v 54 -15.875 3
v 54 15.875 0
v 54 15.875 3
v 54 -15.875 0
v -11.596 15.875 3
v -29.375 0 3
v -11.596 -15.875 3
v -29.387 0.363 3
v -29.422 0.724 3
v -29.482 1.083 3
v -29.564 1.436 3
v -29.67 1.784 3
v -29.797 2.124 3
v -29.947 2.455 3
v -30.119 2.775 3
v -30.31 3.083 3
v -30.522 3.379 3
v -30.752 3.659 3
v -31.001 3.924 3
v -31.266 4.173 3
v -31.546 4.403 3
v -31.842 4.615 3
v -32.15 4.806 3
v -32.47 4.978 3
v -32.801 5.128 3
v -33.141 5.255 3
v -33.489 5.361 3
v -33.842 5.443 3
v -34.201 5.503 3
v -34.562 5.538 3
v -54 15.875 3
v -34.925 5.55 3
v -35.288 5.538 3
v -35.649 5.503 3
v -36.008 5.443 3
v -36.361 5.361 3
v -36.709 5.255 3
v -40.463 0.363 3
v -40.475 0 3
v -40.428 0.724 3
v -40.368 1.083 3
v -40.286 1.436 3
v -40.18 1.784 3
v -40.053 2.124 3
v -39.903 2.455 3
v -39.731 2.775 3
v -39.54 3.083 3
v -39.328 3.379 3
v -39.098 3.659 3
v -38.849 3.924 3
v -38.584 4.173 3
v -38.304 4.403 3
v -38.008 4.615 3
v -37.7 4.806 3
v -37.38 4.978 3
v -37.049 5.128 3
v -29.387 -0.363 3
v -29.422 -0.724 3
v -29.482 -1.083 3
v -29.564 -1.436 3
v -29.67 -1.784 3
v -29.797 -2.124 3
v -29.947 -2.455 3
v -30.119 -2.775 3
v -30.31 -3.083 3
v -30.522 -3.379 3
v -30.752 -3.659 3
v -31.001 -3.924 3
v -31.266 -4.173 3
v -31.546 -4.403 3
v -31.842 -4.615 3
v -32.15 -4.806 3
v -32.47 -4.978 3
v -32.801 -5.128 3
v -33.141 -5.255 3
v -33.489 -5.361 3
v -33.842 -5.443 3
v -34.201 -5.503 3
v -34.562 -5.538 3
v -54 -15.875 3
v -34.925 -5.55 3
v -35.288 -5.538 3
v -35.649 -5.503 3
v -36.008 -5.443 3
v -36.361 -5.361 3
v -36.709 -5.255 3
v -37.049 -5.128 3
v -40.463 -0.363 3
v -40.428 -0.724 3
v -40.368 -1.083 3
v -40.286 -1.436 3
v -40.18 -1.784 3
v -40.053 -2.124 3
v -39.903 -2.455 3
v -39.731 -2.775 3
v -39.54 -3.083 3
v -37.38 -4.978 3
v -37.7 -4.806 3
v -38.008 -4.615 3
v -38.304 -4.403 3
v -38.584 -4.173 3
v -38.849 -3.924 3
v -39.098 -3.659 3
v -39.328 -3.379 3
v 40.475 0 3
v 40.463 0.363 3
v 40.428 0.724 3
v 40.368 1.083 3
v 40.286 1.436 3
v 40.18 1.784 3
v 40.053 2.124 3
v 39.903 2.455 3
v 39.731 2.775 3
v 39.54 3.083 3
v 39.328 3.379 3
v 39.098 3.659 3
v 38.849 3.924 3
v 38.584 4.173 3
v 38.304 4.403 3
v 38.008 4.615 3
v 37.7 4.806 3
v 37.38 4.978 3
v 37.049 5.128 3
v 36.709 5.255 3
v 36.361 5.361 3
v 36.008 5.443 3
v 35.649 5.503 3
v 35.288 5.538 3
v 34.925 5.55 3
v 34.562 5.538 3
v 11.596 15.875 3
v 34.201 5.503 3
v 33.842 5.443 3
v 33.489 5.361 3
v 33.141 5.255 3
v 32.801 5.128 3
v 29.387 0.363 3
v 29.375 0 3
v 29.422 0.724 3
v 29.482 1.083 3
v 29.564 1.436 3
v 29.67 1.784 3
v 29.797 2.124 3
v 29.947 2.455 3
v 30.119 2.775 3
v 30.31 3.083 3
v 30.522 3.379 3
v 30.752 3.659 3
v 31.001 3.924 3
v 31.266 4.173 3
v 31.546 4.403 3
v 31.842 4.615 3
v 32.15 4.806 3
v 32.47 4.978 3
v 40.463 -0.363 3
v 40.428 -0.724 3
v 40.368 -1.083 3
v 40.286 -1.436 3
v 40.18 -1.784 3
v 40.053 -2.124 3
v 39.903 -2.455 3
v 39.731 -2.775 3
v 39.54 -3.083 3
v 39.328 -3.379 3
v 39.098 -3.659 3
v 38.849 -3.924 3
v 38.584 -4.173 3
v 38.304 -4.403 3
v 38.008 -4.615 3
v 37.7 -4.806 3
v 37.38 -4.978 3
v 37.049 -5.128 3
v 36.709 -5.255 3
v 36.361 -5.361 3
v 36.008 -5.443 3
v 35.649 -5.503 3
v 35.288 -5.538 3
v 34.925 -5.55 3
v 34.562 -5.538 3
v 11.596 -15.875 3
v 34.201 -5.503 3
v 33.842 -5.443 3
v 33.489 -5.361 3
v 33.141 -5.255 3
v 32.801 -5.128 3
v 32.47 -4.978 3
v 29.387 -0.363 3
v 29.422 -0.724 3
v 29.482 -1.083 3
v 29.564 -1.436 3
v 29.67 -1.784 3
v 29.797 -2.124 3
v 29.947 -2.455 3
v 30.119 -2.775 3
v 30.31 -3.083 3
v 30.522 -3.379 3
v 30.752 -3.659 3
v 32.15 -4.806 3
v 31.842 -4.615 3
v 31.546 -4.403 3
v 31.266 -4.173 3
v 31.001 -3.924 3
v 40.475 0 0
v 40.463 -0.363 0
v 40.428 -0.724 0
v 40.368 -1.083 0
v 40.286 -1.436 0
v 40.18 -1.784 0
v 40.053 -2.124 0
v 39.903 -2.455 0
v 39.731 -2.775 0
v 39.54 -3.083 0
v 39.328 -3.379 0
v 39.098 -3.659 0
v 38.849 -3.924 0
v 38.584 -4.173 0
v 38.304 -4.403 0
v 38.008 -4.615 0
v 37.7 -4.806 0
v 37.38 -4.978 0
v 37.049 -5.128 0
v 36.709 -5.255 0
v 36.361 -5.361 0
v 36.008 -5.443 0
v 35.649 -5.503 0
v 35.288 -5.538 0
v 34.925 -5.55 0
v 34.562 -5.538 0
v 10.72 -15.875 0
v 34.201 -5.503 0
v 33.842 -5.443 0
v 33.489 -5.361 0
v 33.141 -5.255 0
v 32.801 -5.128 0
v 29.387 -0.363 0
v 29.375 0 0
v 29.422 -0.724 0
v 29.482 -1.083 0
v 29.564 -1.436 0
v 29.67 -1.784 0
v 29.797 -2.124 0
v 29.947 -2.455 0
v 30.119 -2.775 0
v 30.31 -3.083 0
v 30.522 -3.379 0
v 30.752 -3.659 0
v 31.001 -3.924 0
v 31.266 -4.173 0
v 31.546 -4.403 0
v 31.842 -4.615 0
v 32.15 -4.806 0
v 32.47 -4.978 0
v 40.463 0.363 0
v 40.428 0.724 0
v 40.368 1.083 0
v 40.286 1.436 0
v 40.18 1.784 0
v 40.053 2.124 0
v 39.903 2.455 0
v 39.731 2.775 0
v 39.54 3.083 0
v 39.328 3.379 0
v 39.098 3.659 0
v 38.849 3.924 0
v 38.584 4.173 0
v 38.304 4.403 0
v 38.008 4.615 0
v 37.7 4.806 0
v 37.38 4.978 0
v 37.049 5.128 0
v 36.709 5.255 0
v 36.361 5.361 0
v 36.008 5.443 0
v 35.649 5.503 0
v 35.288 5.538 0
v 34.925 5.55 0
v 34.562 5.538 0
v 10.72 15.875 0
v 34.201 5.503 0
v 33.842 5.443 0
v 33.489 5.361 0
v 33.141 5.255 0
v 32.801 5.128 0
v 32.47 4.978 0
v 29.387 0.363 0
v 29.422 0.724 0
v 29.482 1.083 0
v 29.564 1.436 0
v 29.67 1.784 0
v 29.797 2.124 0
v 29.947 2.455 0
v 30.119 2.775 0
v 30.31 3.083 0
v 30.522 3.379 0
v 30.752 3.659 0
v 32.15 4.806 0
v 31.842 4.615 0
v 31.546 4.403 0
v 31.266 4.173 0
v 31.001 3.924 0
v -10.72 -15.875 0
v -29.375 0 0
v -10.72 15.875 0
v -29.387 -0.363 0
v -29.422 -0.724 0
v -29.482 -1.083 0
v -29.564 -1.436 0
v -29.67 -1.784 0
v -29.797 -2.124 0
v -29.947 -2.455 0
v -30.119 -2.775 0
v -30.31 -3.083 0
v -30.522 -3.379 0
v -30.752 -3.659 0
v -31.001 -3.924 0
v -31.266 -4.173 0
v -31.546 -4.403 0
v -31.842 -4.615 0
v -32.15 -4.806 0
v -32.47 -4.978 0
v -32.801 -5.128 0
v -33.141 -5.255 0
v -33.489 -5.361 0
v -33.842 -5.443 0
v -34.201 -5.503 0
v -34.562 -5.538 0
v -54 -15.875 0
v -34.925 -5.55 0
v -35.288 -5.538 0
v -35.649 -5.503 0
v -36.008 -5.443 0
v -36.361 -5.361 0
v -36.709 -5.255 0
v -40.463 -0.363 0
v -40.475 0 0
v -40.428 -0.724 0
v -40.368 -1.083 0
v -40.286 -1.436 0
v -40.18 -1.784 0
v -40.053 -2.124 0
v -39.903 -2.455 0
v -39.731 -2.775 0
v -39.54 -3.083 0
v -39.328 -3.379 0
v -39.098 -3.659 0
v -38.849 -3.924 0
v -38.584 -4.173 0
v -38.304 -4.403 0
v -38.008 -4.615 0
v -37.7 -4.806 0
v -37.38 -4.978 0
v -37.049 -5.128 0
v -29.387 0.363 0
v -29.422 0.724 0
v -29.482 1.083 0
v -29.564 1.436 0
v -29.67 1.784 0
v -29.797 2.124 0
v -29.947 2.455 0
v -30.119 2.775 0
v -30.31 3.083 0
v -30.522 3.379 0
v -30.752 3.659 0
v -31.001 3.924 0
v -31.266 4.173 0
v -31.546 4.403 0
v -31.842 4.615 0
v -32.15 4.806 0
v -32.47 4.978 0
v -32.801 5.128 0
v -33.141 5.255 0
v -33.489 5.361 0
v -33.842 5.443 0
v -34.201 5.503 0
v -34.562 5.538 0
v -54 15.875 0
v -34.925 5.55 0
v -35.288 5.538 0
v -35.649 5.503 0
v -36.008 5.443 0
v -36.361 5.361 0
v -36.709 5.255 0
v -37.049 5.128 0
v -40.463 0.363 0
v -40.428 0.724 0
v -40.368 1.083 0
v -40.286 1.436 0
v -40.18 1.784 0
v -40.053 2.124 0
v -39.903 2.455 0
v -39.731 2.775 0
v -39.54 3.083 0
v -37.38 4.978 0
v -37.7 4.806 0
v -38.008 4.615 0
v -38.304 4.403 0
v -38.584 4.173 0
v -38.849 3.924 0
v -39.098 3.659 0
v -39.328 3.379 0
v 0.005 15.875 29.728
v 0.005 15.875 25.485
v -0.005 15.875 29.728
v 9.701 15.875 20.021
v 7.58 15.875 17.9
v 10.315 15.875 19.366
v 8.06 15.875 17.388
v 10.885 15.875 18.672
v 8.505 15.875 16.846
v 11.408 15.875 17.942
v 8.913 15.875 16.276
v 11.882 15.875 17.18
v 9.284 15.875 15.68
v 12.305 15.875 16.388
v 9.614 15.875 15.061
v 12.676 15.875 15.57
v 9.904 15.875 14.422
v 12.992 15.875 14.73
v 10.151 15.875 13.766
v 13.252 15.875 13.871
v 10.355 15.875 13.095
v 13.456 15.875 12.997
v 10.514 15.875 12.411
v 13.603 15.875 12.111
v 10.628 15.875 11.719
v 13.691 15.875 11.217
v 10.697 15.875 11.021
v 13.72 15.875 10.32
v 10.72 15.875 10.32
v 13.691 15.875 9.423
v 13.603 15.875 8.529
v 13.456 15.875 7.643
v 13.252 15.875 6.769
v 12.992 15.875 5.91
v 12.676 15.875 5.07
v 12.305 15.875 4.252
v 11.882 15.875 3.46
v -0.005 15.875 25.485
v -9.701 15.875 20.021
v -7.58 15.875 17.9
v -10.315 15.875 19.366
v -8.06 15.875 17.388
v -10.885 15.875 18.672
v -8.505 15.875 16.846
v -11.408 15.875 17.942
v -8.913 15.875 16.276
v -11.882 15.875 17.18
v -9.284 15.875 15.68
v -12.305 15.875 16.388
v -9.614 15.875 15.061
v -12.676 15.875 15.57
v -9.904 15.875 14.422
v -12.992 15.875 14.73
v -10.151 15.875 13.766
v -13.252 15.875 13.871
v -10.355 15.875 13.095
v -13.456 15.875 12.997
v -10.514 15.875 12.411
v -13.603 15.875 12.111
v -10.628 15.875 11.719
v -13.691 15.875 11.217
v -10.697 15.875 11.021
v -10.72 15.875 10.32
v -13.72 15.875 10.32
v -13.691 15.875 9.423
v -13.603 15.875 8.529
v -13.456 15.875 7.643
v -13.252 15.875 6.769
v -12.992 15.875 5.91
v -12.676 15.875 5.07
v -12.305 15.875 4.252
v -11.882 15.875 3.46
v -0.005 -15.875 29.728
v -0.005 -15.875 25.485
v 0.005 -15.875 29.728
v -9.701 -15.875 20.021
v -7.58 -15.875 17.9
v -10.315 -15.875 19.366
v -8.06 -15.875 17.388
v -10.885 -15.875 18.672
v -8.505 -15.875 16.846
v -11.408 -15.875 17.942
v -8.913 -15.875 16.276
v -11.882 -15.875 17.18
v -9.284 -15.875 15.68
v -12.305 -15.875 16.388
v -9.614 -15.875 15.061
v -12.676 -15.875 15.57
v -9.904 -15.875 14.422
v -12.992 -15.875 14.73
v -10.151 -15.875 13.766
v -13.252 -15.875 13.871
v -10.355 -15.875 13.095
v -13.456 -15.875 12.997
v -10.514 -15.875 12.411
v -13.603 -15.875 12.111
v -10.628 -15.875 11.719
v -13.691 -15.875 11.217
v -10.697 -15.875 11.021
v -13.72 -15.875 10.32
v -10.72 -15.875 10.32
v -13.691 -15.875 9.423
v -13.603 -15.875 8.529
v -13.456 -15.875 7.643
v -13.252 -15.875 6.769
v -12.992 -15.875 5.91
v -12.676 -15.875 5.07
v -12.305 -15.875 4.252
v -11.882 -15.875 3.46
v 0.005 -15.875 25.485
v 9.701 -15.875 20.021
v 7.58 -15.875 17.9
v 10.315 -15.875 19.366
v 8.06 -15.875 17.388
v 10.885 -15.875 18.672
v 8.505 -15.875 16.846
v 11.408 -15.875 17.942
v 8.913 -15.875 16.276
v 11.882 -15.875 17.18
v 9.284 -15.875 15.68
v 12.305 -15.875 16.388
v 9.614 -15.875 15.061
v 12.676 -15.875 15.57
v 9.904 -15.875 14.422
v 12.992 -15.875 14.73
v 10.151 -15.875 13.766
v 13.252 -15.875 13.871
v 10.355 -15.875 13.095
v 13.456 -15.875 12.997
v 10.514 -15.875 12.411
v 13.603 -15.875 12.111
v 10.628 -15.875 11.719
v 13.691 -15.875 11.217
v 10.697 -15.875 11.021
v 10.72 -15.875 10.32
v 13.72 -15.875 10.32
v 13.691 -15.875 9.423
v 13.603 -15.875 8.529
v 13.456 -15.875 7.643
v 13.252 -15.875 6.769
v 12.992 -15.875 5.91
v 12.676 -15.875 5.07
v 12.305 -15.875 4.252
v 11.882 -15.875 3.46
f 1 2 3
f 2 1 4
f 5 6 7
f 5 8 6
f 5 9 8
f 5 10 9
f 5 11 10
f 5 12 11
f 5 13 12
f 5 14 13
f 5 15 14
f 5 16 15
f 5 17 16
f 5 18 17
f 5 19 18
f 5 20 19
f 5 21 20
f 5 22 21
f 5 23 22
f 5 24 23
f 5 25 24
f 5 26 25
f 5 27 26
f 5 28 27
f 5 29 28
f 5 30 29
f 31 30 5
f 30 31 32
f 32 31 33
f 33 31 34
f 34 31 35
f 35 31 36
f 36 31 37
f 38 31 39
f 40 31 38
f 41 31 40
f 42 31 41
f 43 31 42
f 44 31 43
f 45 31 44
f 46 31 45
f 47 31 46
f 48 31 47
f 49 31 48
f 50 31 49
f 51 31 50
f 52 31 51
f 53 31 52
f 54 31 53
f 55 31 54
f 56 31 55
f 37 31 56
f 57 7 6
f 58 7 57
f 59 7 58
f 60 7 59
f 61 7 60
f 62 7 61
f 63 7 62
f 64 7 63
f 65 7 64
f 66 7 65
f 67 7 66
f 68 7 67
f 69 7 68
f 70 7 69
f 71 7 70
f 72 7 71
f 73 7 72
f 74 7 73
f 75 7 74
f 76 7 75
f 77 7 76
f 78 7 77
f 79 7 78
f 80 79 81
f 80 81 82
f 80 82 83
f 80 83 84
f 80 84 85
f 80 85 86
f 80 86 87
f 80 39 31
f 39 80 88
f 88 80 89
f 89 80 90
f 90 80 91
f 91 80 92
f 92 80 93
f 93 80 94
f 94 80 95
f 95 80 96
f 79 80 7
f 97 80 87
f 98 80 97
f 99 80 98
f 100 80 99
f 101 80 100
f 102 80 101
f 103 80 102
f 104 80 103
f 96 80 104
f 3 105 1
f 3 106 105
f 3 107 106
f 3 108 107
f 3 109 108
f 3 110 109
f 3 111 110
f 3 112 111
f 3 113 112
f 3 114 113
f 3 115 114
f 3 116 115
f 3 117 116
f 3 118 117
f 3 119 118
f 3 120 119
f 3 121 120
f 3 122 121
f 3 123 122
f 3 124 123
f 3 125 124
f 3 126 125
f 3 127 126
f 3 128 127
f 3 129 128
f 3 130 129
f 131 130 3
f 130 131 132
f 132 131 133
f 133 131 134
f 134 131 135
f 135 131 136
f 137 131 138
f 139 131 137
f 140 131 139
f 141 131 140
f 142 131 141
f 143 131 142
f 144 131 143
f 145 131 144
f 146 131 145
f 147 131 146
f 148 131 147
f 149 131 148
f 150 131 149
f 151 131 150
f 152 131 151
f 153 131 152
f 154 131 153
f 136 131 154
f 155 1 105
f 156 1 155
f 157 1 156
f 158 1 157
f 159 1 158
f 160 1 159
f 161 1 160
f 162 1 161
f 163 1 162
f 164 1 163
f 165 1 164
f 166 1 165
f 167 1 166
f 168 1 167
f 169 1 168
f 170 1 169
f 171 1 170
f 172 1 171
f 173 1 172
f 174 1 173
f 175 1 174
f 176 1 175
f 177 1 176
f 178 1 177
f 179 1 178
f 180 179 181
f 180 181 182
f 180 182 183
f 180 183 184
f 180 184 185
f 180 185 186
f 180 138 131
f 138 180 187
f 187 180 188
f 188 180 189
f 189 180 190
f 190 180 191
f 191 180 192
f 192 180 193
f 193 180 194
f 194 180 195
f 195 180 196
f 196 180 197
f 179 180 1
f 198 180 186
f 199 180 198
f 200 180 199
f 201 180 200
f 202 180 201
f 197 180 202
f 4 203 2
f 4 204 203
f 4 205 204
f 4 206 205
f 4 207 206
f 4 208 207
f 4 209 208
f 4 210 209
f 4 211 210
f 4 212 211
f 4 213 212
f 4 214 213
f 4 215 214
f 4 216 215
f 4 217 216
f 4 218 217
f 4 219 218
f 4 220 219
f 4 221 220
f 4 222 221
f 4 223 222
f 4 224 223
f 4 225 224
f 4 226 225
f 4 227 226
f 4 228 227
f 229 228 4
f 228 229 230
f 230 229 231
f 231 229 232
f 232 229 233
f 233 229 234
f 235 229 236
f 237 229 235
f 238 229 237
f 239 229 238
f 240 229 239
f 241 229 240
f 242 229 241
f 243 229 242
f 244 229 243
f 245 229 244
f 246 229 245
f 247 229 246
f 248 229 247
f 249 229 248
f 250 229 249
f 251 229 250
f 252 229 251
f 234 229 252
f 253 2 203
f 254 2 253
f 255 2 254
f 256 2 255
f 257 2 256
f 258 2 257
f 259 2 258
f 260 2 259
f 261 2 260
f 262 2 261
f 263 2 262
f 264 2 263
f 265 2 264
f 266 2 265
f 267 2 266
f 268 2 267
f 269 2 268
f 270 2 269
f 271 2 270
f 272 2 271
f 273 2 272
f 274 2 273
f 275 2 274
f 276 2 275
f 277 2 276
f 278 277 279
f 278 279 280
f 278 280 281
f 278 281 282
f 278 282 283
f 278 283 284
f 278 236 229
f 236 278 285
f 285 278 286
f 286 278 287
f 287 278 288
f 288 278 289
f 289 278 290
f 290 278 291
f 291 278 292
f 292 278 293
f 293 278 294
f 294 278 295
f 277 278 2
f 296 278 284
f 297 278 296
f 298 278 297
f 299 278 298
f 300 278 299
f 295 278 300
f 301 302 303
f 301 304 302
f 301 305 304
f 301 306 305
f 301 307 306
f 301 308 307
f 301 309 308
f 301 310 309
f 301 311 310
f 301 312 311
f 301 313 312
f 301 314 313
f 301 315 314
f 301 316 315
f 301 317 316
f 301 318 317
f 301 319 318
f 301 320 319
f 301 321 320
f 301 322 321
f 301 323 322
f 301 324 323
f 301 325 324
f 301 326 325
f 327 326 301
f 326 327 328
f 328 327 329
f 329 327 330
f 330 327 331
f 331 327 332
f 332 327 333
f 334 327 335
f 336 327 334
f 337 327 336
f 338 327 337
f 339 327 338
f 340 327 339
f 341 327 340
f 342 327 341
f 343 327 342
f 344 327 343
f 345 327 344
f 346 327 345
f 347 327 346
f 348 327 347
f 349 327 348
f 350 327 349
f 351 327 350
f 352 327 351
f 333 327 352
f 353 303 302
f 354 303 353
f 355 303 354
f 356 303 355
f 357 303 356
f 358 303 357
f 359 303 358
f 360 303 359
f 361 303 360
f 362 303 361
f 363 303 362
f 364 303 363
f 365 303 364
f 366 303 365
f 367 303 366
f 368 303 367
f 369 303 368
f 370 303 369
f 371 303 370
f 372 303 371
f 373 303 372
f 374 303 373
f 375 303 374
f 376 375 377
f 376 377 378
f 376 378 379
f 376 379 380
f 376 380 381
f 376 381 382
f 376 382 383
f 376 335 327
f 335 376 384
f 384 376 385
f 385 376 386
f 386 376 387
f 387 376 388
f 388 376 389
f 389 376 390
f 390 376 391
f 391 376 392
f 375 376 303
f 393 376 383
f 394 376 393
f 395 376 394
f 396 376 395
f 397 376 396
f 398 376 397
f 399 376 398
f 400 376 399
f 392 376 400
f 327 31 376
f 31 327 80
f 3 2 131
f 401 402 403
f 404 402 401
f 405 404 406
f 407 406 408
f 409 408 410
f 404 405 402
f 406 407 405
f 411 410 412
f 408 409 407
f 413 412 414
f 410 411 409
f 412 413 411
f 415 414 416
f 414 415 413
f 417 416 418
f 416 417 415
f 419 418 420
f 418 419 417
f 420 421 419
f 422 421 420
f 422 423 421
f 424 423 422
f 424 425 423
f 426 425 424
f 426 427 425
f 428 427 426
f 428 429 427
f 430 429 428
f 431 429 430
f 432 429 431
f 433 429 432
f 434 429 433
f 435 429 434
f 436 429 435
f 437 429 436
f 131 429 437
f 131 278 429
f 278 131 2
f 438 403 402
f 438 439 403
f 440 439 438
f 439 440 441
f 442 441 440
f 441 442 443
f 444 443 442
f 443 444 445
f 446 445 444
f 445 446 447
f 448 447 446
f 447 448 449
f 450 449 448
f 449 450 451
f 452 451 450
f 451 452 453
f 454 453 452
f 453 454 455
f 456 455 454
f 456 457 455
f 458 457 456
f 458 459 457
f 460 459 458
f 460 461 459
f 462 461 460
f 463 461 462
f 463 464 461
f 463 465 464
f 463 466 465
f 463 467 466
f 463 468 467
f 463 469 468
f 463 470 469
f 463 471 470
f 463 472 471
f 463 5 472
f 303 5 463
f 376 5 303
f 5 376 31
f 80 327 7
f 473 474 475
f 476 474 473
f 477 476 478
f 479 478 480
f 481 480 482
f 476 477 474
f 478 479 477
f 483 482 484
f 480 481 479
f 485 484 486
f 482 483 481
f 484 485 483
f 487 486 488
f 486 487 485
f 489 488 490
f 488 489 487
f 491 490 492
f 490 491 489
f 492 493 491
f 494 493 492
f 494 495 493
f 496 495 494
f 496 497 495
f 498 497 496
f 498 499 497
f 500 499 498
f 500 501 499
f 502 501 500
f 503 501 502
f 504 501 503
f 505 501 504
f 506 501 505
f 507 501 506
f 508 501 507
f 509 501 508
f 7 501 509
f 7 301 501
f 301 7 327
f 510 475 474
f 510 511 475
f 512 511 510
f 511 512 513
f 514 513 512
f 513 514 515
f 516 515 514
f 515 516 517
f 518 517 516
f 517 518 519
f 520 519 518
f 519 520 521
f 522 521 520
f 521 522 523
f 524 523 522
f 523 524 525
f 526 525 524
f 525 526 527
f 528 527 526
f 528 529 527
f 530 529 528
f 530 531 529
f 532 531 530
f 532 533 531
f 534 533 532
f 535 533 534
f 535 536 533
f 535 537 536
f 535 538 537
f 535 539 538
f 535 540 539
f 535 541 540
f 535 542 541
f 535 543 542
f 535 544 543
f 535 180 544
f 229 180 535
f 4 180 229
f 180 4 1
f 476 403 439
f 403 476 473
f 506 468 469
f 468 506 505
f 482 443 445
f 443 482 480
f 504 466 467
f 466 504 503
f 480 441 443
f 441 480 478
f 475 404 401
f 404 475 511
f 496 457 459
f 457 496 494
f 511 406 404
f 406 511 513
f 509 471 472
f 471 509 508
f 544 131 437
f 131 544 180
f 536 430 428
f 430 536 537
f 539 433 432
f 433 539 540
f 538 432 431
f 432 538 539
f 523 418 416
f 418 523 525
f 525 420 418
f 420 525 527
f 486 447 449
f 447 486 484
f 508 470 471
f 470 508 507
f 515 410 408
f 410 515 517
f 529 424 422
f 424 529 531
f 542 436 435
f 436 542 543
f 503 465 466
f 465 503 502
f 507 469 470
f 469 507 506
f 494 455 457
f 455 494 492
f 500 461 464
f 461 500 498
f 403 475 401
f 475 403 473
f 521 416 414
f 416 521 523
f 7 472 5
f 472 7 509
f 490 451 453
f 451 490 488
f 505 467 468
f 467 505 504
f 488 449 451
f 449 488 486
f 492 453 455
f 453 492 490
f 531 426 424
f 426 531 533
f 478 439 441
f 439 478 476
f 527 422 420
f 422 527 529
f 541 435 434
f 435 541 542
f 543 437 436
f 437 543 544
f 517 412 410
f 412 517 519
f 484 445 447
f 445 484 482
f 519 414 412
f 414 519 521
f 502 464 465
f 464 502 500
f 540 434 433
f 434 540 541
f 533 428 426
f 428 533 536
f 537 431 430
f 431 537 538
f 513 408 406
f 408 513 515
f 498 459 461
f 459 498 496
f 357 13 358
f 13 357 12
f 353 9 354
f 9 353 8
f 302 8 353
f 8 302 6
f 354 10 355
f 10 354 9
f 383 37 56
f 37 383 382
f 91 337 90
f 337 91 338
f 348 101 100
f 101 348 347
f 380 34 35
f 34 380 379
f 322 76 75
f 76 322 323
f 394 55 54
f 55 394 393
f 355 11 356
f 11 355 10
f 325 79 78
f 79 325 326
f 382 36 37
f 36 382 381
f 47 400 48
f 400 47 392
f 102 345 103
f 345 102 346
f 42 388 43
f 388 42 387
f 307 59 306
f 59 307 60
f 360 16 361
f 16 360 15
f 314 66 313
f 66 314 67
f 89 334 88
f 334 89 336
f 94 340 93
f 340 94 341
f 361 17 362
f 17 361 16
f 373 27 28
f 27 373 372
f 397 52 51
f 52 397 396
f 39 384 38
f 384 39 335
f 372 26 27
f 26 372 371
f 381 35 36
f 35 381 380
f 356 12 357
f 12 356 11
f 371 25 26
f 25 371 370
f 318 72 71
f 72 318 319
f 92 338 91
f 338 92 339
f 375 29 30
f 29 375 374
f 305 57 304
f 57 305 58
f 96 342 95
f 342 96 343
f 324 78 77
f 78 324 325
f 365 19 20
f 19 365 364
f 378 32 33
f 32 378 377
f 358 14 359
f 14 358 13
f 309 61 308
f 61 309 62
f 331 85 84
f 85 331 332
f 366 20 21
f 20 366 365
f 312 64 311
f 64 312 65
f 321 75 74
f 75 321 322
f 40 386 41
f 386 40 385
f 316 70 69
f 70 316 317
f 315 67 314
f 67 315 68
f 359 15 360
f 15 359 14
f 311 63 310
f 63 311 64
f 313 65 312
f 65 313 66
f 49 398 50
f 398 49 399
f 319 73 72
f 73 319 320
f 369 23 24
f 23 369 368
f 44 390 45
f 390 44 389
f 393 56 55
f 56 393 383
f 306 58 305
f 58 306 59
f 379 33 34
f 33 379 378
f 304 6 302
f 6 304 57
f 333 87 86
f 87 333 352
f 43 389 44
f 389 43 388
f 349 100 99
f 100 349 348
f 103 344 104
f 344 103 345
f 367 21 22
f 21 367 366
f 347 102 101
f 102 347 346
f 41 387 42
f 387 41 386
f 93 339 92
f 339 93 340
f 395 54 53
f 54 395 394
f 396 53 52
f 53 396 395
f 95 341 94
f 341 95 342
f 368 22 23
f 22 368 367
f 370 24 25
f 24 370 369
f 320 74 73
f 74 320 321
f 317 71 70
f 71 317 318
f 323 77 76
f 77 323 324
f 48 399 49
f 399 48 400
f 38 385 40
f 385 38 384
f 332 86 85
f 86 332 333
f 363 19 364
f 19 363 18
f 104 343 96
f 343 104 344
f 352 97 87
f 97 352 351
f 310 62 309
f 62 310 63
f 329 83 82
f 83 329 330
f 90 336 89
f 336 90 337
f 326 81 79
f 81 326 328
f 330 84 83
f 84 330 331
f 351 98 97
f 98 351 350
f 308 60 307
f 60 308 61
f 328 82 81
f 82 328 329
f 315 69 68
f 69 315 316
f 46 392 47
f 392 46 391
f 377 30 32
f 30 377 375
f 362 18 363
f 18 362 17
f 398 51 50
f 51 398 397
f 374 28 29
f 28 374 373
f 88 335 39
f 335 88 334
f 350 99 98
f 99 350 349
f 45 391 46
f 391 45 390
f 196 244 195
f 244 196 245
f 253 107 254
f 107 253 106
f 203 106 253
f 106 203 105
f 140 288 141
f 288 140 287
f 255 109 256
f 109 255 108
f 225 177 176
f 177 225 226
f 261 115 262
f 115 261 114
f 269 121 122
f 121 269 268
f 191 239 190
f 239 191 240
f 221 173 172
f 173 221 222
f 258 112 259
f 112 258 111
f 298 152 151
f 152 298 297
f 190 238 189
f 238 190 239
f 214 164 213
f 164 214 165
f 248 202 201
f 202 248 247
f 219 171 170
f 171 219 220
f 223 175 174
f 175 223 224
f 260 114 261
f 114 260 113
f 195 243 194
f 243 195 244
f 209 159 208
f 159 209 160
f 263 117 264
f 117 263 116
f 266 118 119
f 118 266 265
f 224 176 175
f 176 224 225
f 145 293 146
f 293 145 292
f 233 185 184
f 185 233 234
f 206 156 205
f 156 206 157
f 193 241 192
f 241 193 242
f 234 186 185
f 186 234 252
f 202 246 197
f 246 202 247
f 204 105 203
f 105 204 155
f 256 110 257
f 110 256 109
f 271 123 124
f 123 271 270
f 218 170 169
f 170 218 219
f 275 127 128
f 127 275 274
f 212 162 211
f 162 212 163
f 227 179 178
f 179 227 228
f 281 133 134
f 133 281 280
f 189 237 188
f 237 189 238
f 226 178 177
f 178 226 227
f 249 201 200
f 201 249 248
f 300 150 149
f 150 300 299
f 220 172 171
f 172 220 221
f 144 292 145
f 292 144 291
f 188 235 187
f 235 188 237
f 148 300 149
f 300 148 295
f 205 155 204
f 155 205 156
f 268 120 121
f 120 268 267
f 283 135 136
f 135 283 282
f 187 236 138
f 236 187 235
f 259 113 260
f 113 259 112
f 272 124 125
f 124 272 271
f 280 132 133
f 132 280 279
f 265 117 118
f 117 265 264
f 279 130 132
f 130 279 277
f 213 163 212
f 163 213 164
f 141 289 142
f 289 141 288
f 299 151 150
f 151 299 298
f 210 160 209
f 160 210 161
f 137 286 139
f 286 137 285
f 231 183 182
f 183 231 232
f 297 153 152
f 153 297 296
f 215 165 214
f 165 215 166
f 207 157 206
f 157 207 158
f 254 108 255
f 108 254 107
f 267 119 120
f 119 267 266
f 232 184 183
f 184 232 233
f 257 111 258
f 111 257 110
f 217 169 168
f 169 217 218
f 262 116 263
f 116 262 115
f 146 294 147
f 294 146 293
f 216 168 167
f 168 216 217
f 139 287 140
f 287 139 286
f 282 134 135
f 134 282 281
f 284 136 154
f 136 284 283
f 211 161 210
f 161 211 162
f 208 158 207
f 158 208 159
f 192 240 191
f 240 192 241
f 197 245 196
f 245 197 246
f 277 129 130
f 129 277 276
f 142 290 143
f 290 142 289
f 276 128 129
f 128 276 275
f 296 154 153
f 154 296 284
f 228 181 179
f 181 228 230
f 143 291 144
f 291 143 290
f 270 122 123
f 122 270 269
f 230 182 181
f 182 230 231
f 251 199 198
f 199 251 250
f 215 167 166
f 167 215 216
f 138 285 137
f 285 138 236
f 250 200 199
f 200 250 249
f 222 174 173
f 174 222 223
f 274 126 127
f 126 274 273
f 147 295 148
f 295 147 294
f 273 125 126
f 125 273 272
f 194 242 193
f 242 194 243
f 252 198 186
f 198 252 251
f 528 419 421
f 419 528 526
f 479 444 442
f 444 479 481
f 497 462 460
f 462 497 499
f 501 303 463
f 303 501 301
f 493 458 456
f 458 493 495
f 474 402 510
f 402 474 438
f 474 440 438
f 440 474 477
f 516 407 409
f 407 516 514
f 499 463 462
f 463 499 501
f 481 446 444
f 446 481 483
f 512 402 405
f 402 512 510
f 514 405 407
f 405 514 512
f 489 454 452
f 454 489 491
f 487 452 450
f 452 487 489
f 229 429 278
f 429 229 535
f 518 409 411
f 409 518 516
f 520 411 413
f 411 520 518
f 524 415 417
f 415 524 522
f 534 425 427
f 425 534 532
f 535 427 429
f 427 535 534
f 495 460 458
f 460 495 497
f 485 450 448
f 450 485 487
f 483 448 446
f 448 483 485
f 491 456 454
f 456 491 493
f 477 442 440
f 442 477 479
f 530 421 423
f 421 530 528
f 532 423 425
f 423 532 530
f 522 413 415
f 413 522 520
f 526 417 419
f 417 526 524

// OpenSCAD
// Two-hole pipe strap, printed standing on its feet. The roof over the pipe
// is pointed (45 degree flanks) so it prints without support.
pipe_diameter = 20.64;
hole_spacing = 69.85;
strap_width = 31.75;
hole_diameter = 11.1;
wall = 3;
foot = 3;
length = 108;
clear = 0.4;
$fn = 96;

r = pipe_diameter/2 + clear;
zc = pipe_diameter/2;

module saddle_profile(rr) {
    // circle below its centre, 45 degree roof above it (teardrop)
    hull() {
        translate([0, zc]) circle(r = rr);
        translate([0, zc + rr*sqrt(2)]) square(0.01, center = true);
    }
}

difference() {
    union() {
        translate([-length/2, -strap_width/2, 0]) cube([length, strap_width, foot]);
        rotate([90, 0, 0]) linear_extrude(strap_width, center = true)
            intersection() {
                saddle_profile(r + wall);
                translate([-50, 0]) square([100, 50]);
            }
    }
    rotate([90, 0, 0]) linear_extrude(strap_width + 2, center = true) {
        saddle_profile(r);
        translate([-r, -1]) square([2*r, zc + 1]);
    }
    for (x = [-hole_spacing/2, hole_spacing/2])
        translate([x, 0, -1]) cylinder(d = hole_diameter, h = foot + 2);
}
